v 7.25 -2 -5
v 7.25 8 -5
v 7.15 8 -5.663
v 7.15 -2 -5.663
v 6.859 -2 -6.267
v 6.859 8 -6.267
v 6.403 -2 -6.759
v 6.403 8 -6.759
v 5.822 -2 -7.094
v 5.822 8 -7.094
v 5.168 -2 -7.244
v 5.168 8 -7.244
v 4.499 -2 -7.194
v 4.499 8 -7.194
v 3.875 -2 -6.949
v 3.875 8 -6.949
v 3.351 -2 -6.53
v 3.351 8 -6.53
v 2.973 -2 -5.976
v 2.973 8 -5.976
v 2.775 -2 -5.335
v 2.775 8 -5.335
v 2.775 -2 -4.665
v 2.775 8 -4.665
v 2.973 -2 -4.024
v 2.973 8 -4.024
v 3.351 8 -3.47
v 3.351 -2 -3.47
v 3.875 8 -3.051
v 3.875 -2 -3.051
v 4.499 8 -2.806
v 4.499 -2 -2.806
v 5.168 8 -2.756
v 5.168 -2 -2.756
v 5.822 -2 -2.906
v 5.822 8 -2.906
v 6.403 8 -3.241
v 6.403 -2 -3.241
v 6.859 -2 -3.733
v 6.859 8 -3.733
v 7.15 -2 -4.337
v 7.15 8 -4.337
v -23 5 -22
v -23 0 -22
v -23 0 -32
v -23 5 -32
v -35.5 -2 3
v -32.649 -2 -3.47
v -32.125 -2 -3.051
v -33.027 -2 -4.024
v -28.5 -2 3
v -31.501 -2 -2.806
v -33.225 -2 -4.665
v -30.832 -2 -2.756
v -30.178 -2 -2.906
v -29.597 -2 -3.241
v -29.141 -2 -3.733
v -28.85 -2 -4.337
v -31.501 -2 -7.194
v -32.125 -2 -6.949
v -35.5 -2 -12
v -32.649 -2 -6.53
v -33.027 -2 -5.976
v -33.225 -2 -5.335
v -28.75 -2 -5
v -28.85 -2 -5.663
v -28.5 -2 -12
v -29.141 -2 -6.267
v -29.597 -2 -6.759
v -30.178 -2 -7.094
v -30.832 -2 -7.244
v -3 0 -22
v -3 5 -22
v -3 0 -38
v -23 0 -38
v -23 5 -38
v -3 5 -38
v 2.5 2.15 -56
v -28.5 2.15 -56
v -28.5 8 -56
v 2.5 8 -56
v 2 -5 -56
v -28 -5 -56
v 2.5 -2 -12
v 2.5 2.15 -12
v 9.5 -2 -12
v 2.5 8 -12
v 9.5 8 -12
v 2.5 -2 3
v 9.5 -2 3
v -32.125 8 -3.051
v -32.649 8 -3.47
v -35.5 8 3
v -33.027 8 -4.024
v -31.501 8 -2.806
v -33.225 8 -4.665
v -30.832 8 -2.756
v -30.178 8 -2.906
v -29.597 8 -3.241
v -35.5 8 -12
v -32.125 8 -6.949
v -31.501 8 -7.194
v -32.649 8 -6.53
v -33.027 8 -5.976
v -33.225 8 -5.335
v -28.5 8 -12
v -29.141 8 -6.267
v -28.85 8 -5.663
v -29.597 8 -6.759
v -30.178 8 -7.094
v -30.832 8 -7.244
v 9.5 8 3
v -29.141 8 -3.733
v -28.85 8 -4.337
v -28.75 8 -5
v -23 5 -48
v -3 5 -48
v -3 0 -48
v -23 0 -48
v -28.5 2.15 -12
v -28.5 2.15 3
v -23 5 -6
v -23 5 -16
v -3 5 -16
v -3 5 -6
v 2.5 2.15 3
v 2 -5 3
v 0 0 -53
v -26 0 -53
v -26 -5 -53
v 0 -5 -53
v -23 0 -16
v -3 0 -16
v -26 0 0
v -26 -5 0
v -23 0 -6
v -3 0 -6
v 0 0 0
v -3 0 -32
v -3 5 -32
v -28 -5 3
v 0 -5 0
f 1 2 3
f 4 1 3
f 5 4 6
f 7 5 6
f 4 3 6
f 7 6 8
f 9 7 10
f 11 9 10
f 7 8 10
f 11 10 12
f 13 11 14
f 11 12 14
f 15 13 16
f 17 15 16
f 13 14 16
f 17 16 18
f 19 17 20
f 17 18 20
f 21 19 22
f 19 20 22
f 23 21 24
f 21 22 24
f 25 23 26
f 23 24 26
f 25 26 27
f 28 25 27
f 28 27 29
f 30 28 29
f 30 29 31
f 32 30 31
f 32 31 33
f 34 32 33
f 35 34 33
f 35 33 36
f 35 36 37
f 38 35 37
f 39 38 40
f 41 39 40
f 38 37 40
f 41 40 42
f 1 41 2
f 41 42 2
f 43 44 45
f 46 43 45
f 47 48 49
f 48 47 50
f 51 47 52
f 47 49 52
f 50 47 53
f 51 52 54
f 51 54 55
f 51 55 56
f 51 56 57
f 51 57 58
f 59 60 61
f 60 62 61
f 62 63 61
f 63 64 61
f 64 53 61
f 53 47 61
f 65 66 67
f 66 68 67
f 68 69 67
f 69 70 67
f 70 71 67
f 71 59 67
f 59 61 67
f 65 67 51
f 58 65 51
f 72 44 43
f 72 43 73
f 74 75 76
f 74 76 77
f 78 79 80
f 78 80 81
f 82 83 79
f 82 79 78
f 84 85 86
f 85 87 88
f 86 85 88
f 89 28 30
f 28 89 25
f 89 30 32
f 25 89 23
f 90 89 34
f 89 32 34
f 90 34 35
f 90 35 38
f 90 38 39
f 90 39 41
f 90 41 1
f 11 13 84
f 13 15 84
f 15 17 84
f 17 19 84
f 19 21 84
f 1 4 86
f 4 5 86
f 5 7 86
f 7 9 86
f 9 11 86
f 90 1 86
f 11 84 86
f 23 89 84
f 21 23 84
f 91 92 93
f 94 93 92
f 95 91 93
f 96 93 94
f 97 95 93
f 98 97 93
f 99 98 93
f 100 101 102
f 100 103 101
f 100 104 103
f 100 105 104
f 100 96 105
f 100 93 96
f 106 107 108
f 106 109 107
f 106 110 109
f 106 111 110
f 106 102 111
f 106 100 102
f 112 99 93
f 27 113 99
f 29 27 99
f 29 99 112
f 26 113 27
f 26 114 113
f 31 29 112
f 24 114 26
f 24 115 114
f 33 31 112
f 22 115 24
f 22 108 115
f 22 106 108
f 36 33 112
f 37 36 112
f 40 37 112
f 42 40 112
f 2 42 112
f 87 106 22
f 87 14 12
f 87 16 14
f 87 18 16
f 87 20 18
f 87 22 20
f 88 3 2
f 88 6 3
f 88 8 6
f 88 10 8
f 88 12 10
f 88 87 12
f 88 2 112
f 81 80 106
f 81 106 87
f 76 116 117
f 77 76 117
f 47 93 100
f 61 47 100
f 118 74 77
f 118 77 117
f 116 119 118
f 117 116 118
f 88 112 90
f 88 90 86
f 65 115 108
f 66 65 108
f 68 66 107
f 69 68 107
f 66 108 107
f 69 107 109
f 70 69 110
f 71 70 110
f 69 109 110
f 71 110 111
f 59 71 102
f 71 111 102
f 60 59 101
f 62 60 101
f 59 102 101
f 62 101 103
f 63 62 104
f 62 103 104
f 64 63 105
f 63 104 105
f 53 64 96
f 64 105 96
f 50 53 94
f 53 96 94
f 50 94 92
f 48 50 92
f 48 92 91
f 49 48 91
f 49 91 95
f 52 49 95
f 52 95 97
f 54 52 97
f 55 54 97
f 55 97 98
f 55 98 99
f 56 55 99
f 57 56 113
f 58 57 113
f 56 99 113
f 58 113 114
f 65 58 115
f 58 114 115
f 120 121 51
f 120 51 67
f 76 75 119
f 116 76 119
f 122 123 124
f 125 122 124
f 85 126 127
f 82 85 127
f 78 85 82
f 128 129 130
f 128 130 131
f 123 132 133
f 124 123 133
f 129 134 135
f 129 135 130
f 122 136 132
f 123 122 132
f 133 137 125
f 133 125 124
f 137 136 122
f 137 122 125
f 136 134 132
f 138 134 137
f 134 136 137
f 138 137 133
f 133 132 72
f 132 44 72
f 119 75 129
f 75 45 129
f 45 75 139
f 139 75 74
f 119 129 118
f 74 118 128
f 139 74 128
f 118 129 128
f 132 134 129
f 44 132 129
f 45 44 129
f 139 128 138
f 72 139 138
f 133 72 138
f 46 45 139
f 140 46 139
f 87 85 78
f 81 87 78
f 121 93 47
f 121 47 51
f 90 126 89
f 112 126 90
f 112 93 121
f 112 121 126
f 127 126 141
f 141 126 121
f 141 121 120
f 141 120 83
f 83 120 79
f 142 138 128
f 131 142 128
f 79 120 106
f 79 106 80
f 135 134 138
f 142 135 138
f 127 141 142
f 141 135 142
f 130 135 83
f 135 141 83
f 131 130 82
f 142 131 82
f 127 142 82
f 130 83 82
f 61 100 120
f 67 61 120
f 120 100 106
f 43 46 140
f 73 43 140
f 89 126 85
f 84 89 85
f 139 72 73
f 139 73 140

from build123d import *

# Parameters (mm, degrees)
SKETCH1_W           = 26
SKETCH1_H           = 53
SKETCH1_W_2         = 20
SKETCH1_H_2         = 10
BOSS_EXTRUDE1_DEPTH = 5
SKETCH2_W           = 31
SKETCH2_H           = 59
SKETCH2_W_2         = 26
SKETCH2_H_2         = 53
BOSS_EXTRUDE2_DEPTH = 10
SKETCH3_W           = 31
SKETCH3_H           = 59
BOSS_EXTRUDE3_DEPTH = 3
CHAMFER1_SIZE       = 0.5
CHAMFER1_SIZE2      = 7.150333128
SKETCH10_W          = 7
SKETCH10_H          = 15
SKETCH10_R          = 2.25
BOSS_EXTRUDE7_DEPTH = 10


with BuildPart() as part:
    # Sketch1 → Boss-Extrude1 (new body)
    with BuildSketch(Plane(origin=(0, 0, 0), x_dir=(1, 0, 0), z_dir=(0, 1, 0))):
        with Locations((-13, 26.5)):
            Rectangle(SKETCH1_W, SKETCH1_H)
        with Locations((-13, 27)):
            Rectangle(SKETCH1_W_2, SKETCH1_H_2, mode=Mode.SUBTRACT)
        with Locations((-13, 43)):
            Rectangle(SKETCH1_W_2, SKETCH1_H_2, mode=Mode.SUBTRACT)
        with Locations((-13, 11)):
            Rectangle(SKETCH1_W_2, SKETCH1_H_2, mode=Mode.SUBTRACT)
    extrude(amount=BOSS_EXTRUDE1_DEPTH)

    # Sketch2 → Boss-Extrude2 (add)
    with BuildSketch(Plane(origin=(0, 5, 0), x_dir=(1, 0, 0), z_dir=(0, 1, 0))):
        with Locations((-13, 26.5)):
            Rectangle(SKETCH2_W, SKETCH2_H)
        with Locations((-13, 26.5)):
            Rectangle(SKETCH2_W_2, SKETCH2_H_2, mode=Mode.SUBTRACT)
    extrude(amount=-BOSS_EXTRUDE2_DEPTH)

    # Sketch3 → Boss-Extrude3 (add)
    with BuildSketch(Plane(origin=(0, 5, 0), x_dir=(1, 0, 0), z_dir=(0, 1, 0))):
        with Locations((-13, 26.5)):
            Rectangle(SKETCH3_W, SKETCH3_H)
    extrude(amount=BOSS_EXTRUDE3_DEPTH)

    # Chamfer1
    chamfer1_edges = [part.edges().sort_by_distance(p)[0] for p in [
        (-28.5, -5, -26.5),
        (2.5, -5, -26.5),
    ]]
    chamfer1_side = [part.faces().sort_by_distance(p)[0] for p in [
        (-13, -5, -55.333516692),
    ]]
    chamfer(chamfer1_edges, length=CHAMFER1_SIZE, length2=CHAMFER1_SIZE2, reference=chamfer1_side[0])

    # Sketch10 → Boss-Extrude7 (add)
    with BuildSketch(Plane(origin=(0, 8, 0), x_dir=(1, 0, 0), z_dir=(0, 1, 0))):
        with Locations((6, 4.5)):
            Rectangle(SKETCH10_W, SKETCH10_H)
        with Locations((5, 5)):
            Circle(SKETCH10_R, mode=Mode.SUBTRACT)
        with Locations((-32, 4.5)):
            Rectangle(SKETCH10_W, SKETCH10_H)
        with Locations((-31, 5)):
            Circle(SKETCH10_R, mode=Mode.SUBTRACT)
    extrude(amount=-BOSS_EXTRUDE7_DEPTH)


solid = part.part
